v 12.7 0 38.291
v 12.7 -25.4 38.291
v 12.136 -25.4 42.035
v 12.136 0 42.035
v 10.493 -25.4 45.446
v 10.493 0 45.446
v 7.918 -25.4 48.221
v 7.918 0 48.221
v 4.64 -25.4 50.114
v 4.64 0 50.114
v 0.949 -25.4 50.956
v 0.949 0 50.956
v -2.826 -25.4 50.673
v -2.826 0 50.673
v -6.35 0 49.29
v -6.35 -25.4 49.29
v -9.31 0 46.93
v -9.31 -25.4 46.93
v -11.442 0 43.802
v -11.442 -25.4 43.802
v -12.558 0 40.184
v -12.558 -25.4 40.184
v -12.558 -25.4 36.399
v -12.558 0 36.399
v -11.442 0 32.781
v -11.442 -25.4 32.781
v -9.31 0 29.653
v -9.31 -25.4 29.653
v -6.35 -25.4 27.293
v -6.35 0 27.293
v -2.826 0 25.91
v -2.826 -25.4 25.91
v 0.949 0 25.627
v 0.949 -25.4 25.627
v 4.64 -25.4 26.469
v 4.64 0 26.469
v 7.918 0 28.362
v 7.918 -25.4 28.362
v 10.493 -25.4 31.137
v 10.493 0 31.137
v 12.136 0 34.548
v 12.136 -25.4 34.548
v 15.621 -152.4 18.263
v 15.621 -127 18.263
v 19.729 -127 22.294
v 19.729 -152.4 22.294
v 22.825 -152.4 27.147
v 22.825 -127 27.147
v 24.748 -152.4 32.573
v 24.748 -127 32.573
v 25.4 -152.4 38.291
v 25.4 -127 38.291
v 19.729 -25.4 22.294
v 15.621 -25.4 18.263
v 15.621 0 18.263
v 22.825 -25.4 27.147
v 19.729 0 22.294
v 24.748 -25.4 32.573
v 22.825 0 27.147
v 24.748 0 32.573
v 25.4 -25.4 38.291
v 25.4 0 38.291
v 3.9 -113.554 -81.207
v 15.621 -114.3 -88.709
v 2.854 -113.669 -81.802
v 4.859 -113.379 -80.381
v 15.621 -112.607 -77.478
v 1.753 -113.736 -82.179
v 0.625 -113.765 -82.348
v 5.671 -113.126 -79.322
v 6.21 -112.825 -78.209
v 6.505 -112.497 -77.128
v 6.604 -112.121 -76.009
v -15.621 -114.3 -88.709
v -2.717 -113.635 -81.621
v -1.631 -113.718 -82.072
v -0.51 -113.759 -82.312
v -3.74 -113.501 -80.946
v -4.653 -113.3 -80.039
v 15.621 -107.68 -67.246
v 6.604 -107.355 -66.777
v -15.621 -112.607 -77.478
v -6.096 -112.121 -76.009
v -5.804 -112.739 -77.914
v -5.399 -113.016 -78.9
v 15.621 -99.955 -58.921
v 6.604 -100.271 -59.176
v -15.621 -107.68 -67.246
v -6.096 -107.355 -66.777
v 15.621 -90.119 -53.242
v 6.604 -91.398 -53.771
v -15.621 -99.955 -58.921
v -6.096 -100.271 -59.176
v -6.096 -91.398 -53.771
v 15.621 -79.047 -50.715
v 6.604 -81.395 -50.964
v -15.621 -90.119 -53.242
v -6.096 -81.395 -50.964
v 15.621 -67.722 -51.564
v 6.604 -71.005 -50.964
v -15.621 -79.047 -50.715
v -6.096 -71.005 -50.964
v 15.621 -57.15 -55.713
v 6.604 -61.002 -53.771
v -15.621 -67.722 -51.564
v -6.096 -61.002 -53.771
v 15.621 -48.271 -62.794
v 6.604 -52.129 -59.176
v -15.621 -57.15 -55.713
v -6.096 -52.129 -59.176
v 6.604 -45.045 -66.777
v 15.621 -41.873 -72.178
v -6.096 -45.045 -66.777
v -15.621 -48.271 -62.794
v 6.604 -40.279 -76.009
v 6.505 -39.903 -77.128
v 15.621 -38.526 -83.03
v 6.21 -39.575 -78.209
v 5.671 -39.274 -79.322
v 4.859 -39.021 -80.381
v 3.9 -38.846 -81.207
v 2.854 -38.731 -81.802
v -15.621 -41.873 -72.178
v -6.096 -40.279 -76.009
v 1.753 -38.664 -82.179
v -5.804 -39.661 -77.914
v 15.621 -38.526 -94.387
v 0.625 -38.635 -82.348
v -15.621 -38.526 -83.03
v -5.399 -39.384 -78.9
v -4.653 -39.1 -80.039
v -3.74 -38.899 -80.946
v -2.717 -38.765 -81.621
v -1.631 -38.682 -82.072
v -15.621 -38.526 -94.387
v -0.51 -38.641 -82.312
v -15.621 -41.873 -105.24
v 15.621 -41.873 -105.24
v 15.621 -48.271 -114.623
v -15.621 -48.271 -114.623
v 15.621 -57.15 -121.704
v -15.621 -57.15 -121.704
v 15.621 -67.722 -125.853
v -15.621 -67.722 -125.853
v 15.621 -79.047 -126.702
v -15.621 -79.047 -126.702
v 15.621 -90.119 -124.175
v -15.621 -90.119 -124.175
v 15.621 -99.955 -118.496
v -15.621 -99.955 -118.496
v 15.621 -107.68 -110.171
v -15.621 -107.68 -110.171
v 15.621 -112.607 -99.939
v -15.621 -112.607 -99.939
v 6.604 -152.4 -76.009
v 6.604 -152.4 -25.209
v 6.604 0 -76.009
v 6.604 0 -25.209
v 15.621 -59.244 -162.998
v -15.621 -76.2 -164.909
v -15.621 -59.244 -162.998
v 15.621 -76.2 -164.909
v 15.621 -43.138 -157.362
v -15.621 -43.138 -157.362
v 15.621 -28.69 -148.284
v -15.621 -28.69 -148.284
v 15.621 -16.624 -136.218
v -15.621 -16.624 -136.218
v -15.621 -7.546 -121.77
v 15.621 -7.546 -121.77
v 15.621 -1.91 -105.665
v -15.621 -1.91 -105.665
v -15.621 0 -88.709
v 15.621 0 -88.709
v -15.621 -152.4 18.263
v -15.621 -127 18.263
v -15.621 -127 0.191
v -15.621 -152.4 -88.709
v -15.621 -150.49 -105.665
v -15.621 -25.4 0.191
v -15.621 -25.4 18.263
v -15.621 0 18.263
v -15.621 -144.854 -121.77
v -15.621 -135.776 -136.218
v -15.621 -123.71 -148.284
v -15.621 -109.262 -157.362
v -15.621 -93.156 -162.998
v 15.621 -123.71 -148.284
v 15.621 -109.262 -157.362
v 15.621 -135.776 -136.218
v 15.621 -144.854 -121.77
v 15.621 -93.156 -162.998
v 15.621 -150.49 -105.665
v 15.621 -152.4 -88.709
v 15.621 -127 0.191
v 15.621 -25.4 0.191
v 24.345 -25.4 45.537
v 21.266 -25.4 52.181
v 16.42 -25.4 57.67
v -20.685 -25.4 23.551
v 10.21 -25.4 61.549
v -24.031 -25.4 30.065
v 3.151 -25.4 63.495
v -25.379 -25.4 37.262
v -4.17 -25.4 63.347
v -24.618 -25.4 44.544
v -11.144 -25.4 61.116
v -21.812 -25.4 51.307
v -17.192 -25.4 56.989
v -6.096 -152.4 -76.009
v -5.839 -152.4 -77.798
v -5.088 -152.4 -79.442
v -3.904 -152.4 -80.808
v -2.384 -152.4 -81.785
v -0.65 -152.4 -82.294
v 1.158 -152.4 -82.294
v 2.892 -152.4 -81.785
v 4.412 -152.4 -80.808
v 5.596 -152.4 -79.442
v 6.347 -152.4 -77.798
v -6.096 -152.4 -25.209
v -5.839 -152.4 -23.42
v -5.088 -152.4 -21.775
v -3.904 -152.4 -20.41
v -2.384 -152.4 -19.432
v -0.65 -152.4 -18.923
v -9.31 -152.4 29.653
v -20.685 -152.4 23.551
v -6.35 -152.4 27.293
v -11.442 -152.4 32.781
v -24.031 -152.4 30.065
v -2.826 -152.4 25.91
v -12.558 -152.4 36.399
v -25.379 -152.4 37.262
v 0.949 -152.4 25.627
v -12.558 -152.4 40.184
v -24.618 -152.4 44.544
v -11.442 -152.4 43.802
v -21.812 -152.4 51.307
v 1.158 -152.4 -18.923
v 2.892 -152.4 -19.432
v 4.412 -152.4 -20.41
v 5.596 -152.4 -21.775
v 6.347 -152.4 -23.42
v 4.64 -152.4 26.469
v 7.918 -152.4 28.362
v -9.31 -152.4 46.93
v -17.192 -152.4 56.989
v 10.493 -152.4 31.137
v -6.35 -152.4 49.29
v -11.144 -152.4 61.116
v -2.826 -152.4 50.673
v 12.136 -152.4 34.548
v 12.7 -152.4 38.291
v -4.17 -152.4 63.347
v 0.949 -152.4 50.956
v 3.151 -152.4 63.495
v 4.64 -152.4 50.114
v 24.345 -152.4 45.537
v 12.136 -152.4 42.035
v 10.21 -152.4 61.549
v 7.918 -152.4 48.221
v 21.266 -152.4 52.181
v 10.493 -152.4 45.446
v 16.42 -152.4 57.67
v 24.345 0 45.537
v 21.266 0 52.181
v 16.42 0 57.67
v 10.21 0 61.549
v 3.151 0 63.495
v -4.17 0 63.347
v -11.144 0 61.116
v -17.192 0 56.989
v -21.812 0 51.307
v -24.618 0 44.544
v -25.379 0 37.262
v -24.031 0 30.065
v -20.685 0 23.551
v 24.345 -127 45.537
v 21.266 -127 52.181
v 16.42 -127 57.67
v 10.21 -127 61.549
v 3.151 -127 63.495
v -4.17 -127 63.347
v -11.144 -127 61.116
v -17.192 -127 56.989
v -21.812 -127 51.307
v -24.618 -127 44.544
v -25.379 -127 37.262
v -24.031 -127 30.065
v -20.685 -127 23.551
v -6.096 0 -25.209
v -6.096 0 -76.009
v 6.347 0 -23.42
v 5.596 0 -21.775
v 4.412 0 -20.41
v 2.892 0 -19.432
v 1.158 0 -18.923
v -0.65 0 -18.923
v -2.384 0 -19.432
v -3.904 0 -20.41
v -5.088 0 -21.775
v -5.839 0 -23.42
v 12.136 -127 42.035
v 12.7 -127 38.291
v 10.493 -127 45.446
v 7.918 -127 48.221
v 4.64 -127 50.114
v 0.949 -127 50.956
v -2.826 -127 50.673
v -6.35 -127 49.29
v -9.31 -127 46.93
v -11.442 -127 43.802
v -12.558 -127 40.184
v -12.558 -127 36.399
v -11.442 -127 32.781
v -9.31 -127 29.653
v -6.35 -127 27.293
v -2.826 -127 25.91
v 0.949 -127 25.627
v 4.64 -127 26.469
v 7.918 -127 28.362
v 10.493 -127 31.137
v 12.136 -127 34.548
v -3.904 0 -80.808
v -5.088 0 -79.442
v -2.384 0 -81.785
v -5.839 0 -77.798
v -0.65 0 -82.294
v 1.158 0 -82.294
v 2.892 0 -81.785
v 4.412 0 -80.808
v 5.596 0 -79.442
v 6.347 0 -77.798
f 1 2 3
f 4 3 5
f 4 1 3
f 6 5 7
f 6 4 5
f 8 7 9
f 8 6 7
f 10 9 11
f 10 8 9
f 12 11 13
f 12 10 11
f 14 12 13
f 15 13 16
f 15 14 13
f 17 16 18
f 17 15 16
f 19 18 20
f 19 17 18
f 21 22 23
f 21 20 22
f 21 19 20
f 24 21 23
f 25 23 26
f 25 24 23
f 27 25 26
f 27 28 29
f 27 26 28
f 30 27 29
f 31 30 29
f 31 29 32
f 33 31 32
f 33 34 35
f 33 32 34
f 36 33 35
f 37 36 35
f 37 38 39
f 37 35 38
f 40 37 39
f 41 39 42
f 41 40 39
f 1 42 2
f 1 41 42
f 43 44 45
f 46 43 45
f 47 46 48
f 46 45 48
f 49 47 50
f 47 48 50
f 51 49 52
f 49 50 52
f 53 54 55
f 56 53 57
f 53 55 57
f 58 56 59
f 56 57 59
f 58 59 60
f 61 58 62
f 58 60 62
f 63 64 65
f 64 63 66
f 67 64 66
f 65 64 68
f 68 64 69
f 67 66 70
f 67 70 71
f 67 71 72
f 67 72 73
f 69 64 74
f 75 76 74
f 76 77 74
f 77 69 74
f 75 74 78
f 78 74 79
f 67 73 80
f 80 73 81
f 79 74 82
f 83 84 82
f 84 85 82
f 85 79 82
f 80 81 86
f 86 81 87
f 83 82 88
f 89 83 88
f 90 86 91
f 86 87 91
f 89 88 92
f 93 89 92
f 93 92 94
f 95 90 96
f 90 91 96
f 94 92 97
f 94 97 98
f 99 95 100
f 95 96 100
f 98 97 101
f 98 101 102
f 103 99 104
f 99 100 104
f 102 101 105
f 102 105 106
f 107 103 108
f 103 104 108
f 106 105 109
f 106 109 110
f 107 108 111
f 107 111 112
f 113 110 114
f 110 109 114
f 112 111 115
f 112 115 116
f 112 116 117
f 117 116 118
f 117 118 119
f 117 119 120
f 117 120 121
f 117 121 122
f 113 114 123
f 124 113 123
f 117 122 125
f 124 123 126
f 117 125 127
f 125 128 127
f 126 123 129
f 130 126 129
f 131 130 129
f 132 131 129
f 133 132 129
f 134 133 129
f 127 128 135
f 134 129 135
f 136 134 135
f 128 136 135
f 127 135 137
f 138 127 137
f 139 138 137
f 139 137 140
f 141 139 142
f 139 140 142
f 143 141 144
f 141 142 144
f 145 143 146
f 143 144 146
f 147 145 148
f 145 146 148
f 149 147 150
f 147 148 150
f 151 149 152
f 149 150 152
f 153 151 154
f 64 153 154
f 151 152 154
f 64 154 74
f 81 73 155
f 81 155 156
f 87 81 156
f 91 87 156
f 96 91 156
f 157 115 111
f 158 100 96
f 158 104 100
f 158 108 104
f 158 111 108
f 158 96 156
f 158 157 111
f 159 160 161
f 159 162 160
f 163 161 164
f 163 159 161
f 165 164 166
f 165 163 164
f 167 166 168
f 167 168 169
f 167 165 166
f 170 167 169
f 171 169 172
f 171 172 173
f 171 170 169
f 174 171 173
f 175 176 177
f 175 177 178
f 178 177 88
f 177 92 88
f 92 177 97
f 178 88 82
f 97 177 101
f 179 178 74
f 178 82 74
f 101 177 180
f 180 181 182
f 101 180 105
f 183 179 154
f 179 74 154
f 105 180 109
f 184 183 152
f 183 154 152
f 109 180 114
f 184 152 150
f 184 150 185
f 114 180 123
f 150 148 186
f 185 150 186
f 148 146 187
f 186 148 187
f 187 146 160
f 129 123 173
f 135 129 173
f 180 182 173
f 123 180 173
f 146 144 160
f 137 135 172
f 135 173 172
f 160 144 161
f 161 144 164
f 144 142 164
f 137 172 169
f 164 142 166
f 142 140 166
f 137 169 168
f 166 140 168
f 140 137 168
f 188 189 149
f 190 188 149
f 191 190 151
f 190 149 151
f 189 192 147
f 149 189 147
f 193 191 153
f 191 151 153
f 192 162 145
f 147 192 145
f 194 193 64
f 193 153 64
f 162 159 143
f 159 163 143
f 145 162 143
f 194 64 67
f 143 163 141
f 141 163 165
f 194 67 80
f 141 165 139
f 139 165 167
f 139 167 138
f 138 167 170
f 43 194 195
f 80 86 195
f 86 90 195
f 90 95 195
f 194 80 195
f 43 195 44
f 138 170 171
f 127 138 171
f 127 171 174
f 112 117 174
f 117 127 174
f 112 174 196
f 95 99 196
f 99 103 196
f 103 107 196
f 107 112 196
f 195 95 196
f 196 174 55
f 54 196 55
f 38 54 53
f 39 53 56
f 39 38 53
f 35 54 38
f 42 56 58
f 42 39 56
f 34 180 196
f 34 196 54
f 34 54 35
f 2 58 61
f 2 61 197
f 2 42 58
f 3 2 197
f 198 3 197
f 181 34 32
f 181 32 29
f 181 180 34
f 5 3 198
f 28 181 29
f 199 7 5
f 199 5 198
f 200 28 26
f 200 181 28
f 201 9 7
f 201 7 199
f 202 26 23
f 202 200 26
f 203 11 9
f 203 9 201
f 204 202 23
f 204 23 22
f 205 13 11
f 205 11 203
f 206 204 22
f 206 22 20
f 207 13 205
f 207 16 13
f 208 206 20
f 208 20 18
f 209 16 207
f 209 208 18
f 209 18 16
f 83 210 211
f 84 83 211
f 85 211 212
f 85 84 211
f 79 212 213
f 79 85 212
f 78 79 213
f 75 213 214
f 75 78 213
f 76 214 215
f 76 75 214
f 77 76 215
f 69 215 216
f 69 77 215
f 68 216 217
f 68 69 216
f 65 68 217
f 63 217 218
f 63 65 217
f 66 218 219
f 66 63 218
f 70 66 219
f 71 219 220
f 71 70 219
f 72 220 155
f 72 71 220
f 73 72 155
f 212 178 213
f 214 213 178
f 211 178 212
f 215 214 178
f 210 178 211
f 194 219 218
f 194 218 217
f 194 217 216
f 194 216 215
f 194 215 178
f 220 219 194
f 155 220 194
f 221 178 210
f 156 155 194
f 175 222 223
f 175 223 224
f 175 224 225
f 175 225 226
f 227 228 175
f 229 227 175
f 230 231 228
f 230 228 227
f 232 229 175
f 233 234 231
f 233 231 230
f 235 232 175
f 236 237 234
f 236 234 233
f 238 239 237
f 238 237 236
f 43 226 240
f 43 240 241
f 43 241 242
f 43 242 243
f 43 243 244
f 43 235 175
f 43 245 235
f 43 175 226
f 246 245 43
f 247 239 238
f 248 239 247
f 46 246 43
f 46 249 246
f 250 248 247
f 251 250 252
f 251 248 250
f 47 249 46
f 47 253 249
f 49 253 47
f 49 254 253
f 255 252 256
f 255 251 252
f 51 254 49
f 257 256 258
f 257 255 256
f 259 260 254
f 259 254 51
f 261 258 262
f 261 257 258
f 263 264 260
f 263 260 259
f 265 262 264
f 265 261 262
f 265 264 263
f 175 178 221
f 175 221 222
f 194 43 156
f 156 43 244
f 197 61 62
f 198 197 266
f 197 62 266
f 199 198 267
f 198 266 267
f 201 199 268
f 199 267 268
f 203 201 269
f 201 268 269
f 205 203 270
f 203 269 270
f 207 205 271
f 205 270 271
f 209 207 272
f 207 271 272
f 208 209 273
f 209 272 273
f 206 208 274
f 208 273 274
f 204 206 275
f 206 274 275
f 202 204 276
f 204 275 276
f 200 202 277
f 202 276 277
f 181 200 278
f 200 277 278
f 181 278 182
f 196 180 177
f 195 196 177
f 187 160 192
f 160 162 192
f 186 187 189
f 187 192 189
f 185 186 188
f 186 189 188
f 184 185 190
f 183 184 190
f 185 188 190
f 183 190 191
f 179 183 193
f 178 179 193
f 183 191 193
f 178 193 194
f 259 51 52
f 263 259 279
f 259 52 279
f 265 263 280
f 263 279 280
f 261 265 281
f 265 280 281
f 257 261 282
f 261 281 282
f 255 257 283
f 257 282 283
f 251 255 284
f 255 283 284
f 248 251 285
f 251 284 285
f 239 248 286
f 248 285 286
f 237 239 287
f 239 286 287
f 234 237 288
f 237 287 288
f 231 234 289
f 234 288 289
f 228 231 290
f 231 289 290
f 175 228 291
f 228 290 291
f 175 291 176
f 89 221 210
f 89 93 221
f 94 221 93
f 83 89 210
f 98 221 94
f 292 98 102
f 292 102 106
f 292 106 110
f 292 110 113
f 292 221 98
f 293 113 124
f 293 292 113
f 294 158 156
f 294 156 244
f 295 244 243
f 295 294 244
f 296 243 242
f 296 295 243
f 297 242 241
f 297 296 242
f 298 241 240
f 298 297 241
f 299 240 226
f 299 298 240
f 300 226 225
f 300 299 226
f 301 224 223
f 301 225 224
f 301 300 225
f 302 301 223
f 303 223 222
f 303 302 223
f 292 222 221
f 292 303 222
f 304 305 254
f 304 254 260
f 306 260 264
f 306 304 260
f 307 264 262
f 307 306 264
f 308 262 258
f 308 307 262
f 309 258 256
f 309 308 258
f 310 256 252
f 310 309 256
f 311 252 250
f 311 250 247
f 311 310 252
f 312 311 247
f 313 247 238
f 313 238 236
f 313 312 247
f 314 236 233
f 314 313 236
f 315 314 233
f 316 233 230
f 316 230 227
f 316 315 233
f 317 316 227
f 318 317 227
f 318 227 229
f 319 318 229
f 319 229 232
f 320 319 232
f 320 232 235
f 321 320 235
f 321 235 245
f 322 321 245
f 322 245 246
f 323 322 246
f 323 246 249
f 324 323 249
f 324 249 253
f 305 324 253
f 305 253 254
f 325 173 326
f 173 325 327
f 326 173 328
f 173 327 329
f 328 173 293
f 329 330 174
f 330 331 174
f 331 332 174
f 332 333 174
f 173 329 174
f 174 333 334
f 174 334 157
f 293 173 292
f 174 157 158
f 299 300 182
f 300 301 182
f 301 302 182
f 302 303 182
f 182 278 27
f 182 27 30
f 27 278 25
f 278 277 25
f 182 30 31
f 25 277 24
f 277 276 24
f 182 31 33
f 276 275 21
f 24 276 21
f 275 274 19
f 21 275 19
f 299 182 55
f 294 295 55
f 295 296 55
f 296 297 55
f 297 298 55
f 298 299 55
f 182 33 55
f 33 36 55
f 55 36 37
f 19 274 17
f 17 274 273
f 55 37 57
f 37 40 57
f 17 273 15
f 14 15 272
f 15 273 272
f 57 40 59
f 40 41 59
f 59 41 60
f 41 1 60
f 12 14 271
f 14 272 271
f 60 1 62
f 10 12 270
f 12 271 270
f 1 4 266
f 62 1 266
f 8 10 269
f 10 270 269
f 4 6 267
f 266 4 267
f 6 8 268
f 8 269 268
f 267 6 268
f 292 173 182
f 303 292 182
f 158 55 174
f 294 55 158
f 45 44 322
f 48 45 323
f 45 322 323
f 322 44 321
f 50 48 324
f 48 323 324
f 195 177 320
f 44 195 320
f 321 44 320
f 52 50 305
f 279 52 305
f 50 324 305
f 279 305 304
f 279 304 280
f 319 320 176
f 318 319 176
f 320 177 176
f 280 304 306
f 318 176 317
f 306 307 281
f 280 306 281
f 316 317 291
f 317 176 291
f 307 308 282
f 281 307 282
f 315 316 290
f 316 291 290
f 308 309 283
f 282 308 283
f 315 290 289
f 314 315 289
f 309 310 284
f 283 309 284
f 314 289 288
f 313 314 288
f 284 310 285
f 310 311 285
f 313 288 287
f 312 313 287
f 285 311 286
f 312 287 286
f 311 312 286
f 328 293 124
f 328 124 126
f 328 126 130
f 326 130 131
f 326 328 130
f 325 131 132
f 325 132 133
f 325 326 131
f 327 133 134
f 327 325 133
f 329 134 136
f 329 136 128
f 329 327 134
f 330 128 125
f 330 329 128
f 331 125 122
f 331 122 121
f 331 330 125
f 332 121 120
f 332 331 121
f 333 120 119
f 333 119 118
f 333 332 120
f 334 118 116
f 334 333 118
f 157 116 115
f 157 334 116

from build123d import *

# Parameters (mm, degrees)
F0_R          = 12.7
F1_DEPTH      = 152.4
F2_R          = 76.19999
F3_W          = 101.6
F3_H          = 56.6531687857
F4_DEPTH      = 41.022
F4_DEPTH_BACK = 25.4
F6_DEPTH      = 152.401
F3_H_2        = 18.0714114576
F7_DEPTH      = 41.022
F3_R          = 38.1
F8_DEPTH      = 41.022


# Not quite as in the source:
# - a fillet or chamfer is up to 0.001 mm smaller than in the source, because OpenCascade refuses the exact size
# - a feature names something its author has since deleted; it is built from what else it names


with BuildPart() as f1:
    # F0 (on Front) → F1 (new body)
    with BuildSketch(Plane.XZ):
        with BuildLine():
            ThreePointArc((15.621, 18.2628701244), (22.8246949596, 27.1472538948), (25.4, 38.2914586668))
            ThreePointArc((25.4, 38.2914586668), (-11.144204772, 61.1161536264), (-15.621, 18.2628701244))
            ThreePointArc((-15.621, 18.2628701244), (0, 12.8914586668), (15.621, 18.2628701244))
        make_face()
        with Locations((0, 38.2914586668)):
            Circle(F0_R, mode=Mode.SUBTRACT)
        with BuildLine():
            ThreePointArc((15.621, 18.2628701244), (0, 12.8914586668), (-15.621, 18.2628701244))
            Line((-15.621, 18.2628701244), (-15.621, -164.9085413332))
            Line((-15.621, -164.9085413332), (15.621, -164.9085413332))
            Line((15.621, -164.9085413332), (15.621, 18.2628701244))
        make_face()
    extrude(amount=F1_DEPTH)

    # F2 (radius 76.2 in the source; OpenCascade refuses exactly that, so slightly less here)
    f2_edges = [f1.edges().sort_by_distance(p)[0] for p in [
        (0, -152.4, -164.908541),
        (0, 0, -164.908541),
    ]]
    fillet(f2_edges, radius=F2_R)

    # F3 (on face) → F4 (cut, two sides)
    with BuildSketch(Plane(origin=(-15.621, 0, 0), x_dir=(0, -1, 0), z_dir=(-1, 0, 0))) as f4_sk:
        with Locations((76.2, 46.5894545172)):
            Rectangle(F3_W, F3_H)
    extrude(amount=-F4_DEPTH, mode=Mode.SUBTRACT)
    extrude(f4_sk.sketch, amount=F4_DEPTH_BACK, mode=Mode.SUBTRACT)

    # F5 (on Front) → F6 (cut, through all)
    with BuildSketch(Plane.XZ):
        with BuildLine():
            ThreePointArc((6.604, -25.2085413332), (0.254, -18.8585413332), (-6.096, -25.2085413332))
            Line((-6.096, -25.2085413332), (-6.096, -76.0085413332))
            ThreePointArc((-6.096, -76.0085413332), (0.254, -82.3585413332), (6.604, -76.0085413332))
            Line((6.604, -76.0085413332), (6.604, -25.2085413332))
        make_face()
    extrude(amount=F6_DEPTH, mode=Mode.SUBTRACT)

    # F3 (on face) → F7 (cut, through all)
    with BuildSketch(Plane(origin=(-15.621, 0, 0), x_dir=(0, -1, 0), z_dir=(-1, 0, 0))):
        with Locations((76.2, 9.2271643956)):
            Rectangle(F3_W, F3_H_2)
    extrude(amount=-F7_DEPTH, mode=Mode.SUBTRACT)

    # F3 (on face) → F8 (cut, through all)
    with BuildSketch(Plane(origin=(-15.621, 0, 0), x_dir=(0, -1, 0), z_dir=(-1, 0, 0))):
        with Locations((76.2, -88.7085413332)):
            Circle(F3_R)
    extrude(amount=-F8_DEPTH, mode=Mode.SUBTRACT)


solid = f1.part
